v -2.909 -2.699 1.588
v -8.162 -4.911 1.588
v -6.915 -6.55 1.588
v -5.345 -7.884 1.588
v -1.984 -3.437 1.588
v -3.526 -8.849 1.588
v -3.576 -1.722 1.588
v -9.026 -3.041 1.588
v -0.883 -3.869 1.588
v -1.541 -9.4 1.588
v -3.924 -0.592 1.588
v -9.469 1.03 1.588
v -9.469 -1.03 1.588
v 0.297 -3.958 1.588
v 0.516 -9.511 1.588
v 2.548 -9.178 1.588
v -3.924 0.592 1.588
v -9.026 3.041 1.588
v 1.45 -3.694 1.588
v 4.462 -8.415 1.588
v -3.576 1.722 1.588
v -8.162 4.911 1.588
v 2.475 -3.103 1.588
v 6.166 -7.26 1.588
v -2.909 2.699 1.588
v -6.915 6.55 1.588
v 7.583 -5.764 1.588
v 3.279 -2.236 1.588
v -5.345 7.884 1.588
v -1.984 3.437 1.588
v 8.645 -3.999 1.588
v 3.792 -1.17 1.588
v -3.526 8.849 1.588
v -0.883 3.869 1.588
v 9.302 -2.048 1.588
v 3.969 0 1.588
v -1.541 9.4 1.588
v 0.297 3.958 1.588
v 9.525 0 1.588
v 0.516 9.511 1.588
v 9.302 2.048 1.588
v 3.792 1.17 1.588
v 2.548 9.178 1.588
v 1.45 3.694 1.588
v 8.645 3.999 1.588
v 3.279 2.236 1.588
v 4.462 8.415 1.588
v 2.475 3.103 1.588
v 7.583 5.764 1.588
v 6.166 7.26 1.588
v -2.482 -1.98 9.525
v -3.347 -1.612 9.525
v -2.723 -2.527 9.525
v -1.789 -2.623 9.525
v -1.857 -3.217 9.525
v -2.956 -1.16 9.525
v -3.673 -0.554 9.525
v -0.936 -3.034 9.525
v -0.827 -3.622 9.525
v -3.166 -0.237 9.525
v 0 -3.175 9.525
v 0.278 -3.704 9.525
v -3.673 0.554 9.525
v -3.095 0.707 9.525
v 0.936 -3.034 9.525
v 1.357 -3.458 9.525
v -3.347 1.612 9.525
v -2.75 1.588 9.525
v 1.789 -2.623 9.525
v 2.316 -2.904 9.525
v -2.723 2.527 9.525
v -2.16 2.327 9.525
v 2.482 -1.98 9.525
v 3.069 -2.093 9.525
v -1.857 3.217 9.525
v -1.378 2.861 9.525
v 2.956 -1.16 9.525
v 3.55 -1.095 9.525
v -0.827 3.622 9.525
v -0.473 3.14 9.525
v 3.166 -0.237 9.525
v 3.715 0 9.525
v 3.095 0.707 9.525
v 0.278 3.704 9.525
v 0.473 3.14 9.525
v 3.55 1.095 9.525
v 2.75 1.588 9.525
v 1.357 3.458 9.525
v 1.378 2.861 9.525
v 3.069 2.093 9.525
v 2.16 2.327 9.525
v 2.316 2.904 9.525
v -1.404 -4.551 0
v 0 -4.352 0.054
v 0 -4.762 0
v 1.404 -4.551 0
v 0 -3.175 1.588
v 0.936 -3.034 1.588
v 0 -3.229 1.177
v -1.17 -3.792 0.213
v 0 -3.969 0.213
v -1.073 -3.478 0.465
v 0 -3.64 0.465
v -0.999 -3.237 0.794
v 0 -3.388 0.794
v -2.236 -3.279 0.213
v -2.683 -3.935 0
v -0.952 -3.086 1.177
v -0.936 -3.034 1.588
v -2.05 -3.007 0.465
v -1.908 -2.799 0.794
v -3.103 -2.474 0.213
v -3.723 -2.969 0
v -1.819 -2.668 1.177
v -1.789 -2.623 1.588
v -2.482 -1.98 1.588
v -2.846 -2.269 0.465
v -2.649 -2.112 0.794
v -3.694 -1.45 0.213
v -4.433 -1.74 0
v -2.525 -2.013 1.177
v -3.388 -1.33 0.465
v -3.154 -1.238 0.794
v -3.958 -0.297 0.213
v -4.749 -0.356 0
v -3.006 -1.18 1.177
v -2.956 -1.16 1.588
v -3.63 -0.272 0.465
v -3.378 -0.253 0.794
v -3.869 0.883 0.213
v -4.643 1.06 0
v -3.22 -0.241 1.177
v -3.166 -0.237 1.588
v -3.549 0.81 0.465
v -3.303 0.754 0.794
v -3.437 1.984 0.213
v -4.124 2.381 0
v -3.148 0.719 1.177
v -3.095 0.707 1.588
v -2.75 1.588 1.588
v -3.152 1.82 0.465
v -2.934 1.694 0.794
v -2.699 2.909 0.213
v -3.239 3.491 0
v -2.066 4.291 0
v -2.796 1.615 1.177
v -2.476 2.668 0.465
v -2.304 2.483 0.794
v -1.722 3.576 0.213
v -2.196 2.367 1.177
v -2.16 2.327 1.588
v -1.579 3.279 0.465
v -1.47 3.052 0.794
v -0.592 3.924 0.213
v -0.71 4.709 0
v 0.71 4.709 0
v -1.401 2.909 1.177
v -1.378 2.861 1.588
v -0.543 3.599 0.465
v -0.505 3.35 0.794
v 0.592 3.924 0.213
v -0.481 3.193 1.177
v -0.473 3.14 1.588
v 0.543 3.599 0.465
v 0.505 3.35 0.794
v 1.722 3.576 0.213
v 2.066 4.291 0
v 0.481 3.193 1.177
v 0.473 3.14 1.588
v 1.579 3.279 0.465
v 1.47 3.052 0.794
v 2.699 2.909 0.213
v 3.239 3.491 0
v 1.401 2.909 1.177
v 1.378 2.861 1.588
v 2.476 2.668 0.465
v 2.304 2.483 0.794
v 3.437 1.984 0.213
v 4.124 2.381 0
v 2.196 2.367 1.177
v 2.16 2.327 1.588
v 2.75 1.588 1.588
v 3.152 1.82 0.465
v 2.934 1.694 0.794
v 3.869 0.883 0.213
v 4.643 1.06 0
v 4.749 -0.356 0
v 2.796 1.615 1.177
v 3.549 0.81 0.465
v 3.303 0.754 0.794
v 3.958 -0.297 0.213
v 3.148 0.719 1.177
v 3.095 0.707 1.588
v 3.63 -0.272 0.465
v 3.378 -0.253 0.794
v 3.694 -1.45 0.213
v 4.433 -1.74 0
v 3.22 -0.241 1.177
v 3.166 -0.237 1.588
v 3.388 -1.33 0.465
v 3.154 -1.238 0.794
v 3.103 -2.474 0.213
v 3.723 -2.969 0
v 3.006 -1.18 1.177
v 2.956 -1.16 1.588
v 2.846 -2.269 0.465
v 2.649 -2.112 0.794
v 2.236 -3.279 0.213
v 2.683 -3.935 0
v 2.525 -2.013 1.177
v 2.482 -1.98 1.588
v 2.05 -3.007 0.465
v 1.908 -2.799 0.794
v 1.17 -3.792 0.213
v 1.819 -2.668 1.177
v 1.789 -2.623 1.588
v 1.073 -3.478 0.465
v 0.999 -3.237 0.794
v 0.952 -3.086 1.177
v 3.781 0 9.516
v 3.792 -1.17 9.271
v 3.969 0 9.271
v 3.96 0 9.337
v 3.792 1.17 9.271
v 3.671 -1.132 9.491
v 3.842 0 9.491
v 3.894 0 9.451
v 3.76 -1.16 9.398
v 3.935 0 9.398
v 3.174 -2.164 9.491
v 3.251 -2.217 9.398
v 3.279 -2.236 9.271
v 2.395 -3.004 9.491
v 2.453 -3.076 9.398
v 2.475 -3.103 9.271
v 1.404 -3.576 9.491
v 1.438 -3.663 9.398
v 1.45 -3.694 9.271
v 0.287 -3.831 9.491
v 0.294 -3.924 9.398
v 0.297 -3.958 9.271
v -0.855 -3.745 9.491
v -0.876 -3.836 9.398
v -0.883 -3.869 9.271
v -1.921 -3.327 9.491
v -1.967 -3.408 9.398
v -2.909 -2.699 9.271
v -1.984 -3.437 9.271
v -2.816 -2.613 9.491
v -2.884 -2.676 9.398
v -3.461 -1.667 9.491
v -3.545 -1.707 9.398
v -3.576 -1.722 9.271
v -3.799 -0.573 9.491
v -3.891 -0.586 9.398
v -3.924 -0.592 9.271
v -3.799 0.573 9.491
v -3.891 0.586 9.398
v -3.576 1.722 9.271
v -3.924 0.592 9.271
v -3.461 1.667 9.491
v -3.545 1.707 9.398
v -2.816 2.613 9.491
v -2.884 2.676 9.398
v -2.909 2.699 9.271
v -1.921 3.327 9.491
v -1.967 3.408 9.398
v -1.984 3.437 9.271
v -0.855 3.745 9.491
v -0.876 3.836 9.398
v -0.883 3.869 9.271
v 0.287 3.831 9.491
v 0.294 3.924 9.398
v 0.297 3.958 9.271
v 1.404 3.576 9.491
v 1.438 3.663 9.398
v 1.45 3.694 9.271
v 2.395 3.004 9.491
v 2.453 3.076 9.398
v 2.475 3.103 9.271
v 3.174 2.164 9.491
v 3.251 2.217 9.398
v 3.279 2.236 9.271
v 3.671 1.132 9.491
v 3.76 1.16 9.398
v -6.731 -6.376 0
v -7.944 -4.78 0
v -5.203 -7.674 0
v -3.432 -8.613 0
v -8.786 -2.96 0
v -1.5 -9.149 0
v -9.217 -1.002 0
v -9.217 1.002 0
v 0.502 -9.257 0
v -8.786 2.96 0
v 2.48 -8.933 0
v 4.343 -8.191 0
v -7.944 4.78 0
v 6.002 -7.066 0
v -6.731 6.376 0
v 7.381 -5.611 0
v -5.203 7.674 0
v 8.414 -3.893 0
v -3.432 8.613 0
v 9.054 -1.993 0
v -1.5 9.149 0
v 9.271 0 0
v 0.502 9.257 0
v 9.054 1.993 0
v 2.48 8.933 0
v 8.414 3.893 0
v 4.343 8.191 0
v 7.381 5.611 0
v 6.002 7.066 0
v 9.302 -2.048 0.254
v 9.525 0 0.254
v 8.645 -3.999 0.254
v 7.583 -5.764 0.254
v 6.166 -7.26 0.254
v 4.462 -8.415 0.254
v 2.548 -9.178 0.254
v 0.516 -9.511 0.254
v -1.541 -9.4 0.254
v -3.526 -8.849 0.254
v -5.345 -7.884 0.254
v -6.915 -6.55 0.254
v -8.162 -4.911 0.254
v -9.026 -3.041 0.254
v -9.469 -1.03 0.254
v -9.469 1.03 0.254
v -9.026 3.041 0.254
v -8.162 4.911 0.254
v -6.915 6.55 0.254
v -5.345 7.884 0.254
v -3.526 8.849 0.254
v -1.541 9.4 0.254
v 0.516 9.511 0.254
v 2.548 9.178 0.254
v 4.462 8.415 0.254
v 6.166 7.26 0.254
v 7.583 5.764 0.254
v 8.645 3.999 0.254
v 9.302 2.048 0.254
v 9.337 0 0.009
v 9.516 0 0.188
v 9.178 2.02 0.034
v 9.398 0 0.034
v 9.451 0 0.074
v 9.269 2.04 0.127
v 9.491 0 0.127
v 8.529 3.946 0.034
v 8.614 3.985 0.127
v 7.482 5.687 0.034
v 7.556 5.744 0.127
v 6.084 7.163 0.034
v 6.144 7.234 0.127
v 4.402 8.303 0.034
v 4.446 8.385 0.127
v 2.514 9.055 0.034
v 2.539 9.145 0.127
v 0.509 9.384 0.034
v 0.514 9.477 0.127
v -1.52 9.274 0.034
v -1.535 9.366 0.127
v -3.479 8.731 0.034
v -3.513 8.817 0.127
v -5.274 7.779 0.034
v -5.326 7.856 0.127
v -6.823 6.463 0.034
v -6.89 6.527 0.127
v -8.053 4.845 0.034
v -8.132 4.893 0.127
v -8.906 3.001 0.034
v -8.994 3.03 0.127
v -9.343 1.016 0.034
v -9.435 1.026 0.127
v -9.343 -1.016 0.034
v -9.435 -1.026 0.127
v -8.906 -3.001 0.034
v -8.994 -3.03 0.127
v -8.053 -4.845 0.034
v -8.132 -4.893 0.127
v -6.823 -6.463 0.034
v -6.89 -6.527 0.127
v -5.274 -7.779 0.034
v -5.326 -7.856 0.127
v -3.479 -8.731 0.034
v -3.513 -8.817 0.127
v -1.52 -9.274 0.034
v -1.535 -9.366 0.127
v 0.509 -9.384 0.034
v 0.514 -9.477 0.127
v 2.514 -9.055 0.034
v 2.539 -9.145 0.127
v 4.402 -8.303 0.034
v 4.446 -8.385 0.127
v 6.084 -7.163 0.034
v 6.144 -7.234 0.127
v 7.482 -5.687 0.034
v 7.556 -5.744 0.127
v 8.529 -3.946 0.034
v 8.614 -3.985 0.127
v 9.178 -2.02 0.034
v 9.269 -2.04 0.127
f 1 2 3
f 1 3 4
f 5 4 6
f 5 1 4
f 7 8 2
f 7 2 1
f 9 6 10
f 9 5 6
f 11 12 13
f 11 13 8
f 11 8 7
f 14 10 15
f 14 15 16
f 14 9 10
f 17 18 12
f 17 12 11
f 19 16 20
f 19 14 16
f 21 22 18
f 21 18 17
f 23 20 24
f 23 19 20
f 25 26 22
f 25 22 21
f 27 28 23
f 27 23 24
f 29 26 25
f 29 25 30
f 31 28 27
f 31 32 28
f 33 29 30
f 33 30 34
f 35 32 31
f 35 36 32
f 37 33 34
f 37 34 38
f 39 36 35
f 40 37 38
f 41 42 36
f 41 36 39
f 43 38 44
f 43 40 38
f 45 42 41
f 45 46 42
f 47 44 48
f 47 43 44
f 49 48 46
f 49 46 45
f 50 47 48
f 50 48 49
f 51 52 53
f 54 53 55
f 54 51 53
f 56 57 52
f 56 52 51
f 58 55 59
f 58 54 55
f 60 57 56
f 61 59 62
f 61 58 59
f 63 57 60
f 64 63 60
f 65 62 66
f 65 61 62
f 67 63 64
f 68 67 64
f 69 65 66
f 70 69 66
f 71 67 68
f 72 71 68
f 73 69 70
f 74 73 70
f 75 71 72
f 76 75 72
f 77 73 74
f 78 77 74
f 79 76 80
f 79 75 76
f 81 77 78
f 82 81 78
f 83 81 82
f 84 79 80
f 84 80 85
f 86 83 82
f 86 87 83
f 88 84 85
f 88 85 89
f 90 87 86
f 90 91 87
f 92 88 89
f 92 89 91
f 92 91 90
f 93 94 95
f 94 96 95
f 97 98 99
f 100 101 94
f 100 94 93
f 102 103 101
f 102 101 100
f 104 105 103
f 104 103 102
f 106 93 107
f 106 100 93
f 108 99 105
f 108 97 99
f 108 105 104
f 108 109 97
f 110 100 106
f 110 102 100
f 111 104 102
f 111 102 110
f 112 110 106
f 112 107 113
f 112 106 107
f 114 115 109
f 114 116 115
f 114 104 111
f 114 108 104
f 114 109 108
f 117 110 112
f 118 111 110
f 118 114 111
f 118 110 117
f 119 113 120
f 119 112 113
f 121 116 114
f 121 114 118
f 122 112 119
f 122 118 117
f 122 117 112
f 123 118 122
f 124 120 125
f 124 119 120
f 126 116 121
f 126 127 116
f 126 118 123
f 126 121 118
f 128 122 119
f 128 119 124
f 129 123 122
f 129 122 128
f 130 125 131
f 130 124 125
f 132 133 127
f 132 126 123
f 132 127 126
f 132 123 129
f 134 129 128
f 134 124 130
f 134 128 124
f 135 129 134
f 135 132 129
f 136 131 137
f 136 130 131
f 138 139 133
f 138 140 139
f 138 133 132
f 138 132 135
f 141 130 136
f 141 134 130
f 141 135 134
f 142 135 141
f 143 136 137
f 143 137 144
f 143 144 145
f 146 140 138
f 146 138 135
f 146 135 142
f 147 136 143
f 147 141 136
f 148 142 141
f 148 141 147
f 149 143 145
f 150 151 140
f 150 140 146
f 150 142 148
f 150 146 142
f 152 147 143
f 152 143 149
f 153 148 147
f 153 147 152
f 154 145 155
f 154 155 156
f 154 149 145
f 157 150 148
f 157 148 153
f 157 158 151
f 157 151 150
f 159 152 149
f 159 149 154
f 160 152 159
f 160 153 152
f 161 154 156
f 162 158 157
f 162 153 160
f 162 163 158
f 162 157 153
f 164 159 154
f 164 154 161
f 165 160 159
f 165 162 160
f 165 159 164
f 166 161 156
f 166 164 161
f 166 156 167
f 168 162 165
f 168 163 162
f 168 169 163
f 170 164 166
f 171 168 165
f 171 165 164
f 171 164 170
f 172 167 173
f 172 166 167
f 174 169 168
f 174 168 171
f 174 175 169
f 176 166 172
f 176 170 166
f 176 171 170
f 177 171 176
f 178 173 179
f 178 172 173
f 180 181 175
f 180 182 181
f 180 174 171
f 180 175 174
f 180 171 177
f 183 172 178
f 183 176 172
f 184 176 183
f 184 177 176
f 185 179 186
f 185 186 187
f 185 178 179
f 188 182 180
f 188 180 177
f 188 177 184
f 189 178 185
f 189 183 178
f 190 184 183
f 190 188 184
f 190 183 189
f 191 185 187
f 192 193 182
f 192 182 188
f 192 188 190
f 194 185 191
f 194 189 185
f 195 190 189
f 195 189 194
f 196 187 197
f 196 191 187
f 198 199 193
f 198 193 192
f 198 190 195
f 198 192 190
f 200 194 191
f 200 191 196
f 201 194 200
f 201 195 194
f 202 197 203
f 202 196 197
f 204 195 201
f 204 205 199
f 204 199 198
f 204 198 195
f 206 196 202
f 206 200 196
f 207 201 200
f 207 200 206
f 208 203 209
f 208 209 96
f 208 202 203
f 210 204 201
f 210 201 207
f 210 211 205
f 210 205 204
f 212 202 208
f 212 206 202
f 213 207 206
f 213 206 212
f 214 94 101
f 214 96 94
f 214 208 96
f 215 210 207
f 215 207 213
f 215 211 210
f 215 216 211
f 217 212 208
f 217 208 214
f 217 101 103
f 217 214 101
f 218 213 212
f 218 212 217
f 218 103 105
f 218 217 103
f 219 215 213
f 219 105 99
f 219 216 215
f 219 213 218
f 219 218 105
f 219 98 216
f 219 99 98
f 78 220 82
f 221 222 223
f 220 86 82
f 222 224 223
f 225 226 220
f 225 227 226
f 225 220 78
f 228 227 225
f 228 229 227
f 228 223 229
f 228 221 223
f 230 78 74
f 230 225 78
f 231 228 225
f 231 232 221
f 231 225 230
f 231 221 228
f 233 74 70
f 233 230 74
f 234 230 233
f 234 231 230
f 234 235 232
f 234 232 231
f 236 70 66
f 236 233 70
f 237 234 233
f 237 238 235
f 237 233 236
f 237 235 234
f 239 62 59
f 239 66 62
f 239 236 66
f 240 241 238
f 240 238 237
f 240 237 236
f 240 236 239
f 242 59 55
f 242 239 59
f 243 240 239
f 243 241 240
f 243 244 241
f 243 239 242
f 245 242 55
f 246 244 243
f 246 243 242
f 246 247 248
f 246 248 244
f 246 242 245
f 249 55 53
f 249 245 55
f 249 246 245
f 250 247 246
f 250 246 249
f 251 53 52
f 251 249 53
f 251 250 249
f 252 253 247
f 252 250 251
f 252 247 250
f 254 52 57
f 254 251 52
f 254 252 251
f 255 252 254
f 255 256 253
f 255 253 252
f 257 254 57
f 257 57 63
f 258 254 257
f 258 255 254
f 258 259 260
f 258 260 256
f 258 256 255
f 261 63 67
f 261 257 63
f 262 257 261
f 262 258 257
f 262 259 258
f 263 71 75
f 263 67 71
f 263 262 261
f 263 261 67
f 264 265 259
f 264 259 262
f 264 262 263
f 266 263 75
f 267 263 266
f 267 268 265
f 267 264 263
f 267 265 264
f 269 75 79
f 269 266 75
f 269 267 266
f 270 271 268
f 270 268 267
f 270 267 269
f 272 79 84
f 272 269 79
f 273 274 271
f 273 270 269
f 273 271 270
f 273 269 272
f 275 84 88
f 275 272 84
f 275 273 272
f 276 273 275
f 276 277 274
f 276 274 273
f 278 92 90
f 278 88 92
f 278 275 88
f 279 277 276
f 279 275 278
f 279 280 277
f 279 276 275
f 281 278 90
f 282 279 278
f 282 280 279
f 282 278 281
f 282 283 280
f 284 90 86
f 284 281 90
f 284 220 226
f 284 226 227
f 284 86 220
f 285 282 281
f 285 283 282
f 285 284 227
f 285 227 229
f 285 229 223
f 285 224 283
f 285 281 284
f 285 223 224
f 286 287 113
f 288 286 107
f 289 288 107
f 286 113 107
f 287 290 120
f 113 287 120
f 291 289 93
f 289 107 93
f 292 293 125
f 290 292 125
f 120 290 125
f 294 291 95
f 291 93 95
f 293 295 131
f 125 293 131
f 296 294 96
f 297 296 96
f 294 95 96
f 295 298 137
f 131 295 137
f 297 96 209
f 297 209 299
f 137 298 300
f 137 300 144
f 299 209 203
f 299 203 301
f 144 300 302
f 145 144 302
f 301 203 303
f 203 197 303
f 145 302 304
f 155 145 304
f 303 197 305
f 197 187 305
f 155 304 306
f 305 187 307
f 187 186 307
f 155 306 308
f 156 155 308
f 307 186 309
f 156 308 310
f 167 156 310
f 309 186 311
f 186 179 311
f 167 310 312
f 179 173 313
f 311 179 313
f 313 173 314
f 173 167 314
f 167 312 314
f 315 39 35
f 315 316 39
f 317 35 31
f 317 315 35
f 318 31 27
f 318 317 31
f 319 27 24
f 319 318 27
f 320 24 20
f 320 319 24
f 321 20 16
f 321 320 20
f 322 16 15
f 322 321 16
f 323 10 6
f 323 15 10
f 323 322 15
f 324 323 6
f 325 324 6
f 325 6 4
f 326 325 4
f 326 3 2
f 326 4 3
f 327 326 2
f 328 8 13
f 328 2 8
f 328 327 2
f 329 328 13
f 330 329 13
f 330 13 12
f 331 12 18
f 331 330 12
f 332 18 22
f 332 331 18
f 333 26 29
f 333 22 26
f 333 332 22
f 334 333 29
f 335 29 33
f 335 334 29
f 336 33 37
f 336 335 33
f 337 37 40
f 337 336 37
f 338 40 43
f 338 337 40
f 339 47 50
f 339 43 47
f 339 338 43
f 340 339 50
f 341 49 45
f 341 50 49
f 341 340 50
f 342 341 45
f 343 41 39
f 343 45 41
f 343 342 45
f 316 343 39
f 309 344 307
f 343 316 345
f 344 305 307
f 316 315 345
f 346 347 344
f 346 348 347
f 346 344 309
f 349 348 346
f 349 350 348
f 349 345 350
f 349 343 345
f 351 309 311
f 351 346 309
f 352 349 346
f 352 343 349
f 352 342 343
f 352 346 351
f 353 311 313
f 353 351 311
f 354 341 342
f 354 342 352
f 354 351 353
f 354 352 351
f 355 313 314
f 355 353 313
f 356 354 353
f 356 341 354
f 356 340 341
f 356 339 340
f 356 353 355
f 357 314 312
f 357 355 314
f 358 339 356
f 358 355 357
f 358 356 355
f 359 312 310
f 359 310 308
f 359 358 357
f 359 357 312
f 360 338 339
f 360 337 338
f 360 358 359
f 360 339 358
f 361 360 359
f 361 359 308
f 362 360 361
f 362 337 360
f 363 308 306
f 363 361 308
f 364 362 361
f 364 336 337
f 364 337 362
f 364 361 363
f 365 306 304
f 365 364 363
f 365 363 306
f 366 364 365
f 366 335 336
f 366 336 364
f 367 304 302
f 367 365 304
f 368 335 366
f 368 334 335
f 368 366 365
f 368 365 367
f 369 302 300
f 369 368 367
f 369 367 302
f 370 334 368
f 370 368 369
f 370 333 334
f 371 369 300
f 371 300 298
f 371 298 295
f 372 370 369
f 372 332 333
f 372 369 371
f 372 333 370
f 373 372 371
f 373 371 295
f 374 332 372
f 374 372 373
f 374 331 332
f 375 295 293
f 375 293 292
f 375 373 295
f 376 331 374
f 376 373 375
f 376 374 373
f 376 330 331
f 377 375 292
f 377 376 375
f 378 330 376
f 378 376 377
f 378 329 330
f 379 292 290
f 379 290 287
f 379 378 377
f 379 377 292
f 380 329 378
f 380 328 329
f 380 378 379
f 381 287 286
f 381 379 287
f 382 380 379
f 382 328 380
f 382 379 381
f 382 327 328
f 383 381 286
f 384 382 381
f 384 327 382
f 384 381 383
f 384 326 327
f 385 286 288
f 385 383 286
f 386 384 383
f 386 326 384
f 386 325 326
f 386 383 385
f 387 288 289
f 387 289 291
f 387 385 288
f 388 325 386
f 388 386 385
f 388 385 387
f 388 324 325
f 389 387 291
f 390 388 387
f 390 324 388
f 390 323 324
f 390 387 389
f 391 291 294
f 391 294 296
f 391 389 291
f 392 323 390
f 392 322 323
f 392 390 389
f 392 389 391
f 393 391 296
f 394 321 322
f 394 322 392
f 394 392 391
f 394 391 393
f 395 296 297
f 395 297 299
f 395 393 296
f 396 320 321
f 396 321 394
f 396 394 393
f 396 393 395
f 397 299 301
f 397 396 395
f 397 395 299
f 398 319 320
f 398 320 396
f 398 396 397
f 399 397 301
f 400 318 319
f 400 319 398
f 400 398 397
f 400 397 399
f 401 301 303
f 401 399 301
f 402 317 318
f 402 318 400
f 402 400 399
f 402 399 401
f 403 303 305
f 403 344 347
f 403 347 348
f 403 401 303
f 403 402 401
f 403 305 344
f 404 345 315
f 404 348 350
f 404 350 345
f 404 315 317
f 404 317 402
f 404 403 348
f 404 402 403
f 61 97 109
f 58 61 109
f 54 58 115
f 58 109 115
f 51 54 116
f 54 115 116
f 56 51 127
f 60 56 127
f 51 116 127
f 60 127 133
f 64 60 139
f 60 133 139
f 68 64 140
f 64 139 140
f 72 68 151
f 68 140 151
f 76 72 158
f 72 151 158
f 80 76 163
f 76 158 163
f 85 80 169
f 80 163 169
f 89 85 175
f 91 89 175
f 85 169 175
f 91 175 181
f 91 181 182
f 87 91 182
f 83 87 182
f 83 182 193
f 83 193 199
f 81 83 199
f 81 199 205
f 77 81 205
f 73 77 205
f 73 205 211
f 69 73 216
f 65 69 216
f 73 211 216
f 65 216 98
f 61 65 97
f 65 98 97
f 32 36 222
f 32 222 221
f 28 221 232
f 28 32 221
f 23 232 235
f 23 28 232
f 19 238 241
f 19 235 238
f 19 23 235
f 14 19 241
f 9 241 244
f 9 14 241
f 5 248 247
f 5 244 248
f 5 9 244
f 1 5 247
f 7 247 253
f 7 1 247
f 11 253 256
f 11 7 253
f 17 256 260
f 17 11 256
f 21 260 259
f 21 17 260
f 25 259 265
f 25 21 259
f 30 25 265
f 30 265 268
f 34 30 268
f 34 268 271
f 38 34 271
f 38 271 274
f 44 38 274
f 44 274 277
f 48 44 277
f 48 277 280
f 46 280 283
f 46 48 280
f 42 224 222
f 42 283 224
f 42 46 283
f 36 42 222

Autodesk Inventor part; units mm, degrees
ref_plane "YZ Plane" through (0, 0, 0) normal (1, 0, 0) x (0, 1, 0)
ref_plane "XZ Plane" through (0, 0, 0) normal (0, 1, 0) x (-1, 0, 0)
ref_plane "XY Plane" through (0, 0, 0) normal (0, 0, 1) x (1, 0, 0)
sketch "Sketch1" plane through (0, 0, 0) normal (0, 0, 1) x (1, 0, 0)
  circle A0 centre (0, 0) radius 9.525
  dimension "d0" = 19.05
extrude "Extrusion1" add sketch "Sketch1" along normal blind 1.5875
sketch "Sketch2" plane through (0, 0, 1.5875) normal (0, 0, 1) x (1, 0, 0)
  circle A0 centre (0, 0) radius 9.525 projected
  circle A1 centre (0, 0) radius 3.9688
  dimension "d3" = 7.9375
extrude "Extrusion2" add sketch "Sketch2" along normal blind 7.9375 contours A1
hole "Hole1" at (0, 0, 9.525) direction (0, 0, -1) diameter 6.35 depth 25.4 tip angle 118
thread "Thread1" size "1/4-20 UNC" class "2B" standard "ANSI Unified Screw Threads" full length
fillet "Fillet1" radius 1.5875 1 edges at (0, 3.175, 0)
fillet "Fillet2" radius 0.254 2 edges at (-3.9688, 0, 9.525) (-9.525, 0, 0)
properties part number "Deck_Nut"
